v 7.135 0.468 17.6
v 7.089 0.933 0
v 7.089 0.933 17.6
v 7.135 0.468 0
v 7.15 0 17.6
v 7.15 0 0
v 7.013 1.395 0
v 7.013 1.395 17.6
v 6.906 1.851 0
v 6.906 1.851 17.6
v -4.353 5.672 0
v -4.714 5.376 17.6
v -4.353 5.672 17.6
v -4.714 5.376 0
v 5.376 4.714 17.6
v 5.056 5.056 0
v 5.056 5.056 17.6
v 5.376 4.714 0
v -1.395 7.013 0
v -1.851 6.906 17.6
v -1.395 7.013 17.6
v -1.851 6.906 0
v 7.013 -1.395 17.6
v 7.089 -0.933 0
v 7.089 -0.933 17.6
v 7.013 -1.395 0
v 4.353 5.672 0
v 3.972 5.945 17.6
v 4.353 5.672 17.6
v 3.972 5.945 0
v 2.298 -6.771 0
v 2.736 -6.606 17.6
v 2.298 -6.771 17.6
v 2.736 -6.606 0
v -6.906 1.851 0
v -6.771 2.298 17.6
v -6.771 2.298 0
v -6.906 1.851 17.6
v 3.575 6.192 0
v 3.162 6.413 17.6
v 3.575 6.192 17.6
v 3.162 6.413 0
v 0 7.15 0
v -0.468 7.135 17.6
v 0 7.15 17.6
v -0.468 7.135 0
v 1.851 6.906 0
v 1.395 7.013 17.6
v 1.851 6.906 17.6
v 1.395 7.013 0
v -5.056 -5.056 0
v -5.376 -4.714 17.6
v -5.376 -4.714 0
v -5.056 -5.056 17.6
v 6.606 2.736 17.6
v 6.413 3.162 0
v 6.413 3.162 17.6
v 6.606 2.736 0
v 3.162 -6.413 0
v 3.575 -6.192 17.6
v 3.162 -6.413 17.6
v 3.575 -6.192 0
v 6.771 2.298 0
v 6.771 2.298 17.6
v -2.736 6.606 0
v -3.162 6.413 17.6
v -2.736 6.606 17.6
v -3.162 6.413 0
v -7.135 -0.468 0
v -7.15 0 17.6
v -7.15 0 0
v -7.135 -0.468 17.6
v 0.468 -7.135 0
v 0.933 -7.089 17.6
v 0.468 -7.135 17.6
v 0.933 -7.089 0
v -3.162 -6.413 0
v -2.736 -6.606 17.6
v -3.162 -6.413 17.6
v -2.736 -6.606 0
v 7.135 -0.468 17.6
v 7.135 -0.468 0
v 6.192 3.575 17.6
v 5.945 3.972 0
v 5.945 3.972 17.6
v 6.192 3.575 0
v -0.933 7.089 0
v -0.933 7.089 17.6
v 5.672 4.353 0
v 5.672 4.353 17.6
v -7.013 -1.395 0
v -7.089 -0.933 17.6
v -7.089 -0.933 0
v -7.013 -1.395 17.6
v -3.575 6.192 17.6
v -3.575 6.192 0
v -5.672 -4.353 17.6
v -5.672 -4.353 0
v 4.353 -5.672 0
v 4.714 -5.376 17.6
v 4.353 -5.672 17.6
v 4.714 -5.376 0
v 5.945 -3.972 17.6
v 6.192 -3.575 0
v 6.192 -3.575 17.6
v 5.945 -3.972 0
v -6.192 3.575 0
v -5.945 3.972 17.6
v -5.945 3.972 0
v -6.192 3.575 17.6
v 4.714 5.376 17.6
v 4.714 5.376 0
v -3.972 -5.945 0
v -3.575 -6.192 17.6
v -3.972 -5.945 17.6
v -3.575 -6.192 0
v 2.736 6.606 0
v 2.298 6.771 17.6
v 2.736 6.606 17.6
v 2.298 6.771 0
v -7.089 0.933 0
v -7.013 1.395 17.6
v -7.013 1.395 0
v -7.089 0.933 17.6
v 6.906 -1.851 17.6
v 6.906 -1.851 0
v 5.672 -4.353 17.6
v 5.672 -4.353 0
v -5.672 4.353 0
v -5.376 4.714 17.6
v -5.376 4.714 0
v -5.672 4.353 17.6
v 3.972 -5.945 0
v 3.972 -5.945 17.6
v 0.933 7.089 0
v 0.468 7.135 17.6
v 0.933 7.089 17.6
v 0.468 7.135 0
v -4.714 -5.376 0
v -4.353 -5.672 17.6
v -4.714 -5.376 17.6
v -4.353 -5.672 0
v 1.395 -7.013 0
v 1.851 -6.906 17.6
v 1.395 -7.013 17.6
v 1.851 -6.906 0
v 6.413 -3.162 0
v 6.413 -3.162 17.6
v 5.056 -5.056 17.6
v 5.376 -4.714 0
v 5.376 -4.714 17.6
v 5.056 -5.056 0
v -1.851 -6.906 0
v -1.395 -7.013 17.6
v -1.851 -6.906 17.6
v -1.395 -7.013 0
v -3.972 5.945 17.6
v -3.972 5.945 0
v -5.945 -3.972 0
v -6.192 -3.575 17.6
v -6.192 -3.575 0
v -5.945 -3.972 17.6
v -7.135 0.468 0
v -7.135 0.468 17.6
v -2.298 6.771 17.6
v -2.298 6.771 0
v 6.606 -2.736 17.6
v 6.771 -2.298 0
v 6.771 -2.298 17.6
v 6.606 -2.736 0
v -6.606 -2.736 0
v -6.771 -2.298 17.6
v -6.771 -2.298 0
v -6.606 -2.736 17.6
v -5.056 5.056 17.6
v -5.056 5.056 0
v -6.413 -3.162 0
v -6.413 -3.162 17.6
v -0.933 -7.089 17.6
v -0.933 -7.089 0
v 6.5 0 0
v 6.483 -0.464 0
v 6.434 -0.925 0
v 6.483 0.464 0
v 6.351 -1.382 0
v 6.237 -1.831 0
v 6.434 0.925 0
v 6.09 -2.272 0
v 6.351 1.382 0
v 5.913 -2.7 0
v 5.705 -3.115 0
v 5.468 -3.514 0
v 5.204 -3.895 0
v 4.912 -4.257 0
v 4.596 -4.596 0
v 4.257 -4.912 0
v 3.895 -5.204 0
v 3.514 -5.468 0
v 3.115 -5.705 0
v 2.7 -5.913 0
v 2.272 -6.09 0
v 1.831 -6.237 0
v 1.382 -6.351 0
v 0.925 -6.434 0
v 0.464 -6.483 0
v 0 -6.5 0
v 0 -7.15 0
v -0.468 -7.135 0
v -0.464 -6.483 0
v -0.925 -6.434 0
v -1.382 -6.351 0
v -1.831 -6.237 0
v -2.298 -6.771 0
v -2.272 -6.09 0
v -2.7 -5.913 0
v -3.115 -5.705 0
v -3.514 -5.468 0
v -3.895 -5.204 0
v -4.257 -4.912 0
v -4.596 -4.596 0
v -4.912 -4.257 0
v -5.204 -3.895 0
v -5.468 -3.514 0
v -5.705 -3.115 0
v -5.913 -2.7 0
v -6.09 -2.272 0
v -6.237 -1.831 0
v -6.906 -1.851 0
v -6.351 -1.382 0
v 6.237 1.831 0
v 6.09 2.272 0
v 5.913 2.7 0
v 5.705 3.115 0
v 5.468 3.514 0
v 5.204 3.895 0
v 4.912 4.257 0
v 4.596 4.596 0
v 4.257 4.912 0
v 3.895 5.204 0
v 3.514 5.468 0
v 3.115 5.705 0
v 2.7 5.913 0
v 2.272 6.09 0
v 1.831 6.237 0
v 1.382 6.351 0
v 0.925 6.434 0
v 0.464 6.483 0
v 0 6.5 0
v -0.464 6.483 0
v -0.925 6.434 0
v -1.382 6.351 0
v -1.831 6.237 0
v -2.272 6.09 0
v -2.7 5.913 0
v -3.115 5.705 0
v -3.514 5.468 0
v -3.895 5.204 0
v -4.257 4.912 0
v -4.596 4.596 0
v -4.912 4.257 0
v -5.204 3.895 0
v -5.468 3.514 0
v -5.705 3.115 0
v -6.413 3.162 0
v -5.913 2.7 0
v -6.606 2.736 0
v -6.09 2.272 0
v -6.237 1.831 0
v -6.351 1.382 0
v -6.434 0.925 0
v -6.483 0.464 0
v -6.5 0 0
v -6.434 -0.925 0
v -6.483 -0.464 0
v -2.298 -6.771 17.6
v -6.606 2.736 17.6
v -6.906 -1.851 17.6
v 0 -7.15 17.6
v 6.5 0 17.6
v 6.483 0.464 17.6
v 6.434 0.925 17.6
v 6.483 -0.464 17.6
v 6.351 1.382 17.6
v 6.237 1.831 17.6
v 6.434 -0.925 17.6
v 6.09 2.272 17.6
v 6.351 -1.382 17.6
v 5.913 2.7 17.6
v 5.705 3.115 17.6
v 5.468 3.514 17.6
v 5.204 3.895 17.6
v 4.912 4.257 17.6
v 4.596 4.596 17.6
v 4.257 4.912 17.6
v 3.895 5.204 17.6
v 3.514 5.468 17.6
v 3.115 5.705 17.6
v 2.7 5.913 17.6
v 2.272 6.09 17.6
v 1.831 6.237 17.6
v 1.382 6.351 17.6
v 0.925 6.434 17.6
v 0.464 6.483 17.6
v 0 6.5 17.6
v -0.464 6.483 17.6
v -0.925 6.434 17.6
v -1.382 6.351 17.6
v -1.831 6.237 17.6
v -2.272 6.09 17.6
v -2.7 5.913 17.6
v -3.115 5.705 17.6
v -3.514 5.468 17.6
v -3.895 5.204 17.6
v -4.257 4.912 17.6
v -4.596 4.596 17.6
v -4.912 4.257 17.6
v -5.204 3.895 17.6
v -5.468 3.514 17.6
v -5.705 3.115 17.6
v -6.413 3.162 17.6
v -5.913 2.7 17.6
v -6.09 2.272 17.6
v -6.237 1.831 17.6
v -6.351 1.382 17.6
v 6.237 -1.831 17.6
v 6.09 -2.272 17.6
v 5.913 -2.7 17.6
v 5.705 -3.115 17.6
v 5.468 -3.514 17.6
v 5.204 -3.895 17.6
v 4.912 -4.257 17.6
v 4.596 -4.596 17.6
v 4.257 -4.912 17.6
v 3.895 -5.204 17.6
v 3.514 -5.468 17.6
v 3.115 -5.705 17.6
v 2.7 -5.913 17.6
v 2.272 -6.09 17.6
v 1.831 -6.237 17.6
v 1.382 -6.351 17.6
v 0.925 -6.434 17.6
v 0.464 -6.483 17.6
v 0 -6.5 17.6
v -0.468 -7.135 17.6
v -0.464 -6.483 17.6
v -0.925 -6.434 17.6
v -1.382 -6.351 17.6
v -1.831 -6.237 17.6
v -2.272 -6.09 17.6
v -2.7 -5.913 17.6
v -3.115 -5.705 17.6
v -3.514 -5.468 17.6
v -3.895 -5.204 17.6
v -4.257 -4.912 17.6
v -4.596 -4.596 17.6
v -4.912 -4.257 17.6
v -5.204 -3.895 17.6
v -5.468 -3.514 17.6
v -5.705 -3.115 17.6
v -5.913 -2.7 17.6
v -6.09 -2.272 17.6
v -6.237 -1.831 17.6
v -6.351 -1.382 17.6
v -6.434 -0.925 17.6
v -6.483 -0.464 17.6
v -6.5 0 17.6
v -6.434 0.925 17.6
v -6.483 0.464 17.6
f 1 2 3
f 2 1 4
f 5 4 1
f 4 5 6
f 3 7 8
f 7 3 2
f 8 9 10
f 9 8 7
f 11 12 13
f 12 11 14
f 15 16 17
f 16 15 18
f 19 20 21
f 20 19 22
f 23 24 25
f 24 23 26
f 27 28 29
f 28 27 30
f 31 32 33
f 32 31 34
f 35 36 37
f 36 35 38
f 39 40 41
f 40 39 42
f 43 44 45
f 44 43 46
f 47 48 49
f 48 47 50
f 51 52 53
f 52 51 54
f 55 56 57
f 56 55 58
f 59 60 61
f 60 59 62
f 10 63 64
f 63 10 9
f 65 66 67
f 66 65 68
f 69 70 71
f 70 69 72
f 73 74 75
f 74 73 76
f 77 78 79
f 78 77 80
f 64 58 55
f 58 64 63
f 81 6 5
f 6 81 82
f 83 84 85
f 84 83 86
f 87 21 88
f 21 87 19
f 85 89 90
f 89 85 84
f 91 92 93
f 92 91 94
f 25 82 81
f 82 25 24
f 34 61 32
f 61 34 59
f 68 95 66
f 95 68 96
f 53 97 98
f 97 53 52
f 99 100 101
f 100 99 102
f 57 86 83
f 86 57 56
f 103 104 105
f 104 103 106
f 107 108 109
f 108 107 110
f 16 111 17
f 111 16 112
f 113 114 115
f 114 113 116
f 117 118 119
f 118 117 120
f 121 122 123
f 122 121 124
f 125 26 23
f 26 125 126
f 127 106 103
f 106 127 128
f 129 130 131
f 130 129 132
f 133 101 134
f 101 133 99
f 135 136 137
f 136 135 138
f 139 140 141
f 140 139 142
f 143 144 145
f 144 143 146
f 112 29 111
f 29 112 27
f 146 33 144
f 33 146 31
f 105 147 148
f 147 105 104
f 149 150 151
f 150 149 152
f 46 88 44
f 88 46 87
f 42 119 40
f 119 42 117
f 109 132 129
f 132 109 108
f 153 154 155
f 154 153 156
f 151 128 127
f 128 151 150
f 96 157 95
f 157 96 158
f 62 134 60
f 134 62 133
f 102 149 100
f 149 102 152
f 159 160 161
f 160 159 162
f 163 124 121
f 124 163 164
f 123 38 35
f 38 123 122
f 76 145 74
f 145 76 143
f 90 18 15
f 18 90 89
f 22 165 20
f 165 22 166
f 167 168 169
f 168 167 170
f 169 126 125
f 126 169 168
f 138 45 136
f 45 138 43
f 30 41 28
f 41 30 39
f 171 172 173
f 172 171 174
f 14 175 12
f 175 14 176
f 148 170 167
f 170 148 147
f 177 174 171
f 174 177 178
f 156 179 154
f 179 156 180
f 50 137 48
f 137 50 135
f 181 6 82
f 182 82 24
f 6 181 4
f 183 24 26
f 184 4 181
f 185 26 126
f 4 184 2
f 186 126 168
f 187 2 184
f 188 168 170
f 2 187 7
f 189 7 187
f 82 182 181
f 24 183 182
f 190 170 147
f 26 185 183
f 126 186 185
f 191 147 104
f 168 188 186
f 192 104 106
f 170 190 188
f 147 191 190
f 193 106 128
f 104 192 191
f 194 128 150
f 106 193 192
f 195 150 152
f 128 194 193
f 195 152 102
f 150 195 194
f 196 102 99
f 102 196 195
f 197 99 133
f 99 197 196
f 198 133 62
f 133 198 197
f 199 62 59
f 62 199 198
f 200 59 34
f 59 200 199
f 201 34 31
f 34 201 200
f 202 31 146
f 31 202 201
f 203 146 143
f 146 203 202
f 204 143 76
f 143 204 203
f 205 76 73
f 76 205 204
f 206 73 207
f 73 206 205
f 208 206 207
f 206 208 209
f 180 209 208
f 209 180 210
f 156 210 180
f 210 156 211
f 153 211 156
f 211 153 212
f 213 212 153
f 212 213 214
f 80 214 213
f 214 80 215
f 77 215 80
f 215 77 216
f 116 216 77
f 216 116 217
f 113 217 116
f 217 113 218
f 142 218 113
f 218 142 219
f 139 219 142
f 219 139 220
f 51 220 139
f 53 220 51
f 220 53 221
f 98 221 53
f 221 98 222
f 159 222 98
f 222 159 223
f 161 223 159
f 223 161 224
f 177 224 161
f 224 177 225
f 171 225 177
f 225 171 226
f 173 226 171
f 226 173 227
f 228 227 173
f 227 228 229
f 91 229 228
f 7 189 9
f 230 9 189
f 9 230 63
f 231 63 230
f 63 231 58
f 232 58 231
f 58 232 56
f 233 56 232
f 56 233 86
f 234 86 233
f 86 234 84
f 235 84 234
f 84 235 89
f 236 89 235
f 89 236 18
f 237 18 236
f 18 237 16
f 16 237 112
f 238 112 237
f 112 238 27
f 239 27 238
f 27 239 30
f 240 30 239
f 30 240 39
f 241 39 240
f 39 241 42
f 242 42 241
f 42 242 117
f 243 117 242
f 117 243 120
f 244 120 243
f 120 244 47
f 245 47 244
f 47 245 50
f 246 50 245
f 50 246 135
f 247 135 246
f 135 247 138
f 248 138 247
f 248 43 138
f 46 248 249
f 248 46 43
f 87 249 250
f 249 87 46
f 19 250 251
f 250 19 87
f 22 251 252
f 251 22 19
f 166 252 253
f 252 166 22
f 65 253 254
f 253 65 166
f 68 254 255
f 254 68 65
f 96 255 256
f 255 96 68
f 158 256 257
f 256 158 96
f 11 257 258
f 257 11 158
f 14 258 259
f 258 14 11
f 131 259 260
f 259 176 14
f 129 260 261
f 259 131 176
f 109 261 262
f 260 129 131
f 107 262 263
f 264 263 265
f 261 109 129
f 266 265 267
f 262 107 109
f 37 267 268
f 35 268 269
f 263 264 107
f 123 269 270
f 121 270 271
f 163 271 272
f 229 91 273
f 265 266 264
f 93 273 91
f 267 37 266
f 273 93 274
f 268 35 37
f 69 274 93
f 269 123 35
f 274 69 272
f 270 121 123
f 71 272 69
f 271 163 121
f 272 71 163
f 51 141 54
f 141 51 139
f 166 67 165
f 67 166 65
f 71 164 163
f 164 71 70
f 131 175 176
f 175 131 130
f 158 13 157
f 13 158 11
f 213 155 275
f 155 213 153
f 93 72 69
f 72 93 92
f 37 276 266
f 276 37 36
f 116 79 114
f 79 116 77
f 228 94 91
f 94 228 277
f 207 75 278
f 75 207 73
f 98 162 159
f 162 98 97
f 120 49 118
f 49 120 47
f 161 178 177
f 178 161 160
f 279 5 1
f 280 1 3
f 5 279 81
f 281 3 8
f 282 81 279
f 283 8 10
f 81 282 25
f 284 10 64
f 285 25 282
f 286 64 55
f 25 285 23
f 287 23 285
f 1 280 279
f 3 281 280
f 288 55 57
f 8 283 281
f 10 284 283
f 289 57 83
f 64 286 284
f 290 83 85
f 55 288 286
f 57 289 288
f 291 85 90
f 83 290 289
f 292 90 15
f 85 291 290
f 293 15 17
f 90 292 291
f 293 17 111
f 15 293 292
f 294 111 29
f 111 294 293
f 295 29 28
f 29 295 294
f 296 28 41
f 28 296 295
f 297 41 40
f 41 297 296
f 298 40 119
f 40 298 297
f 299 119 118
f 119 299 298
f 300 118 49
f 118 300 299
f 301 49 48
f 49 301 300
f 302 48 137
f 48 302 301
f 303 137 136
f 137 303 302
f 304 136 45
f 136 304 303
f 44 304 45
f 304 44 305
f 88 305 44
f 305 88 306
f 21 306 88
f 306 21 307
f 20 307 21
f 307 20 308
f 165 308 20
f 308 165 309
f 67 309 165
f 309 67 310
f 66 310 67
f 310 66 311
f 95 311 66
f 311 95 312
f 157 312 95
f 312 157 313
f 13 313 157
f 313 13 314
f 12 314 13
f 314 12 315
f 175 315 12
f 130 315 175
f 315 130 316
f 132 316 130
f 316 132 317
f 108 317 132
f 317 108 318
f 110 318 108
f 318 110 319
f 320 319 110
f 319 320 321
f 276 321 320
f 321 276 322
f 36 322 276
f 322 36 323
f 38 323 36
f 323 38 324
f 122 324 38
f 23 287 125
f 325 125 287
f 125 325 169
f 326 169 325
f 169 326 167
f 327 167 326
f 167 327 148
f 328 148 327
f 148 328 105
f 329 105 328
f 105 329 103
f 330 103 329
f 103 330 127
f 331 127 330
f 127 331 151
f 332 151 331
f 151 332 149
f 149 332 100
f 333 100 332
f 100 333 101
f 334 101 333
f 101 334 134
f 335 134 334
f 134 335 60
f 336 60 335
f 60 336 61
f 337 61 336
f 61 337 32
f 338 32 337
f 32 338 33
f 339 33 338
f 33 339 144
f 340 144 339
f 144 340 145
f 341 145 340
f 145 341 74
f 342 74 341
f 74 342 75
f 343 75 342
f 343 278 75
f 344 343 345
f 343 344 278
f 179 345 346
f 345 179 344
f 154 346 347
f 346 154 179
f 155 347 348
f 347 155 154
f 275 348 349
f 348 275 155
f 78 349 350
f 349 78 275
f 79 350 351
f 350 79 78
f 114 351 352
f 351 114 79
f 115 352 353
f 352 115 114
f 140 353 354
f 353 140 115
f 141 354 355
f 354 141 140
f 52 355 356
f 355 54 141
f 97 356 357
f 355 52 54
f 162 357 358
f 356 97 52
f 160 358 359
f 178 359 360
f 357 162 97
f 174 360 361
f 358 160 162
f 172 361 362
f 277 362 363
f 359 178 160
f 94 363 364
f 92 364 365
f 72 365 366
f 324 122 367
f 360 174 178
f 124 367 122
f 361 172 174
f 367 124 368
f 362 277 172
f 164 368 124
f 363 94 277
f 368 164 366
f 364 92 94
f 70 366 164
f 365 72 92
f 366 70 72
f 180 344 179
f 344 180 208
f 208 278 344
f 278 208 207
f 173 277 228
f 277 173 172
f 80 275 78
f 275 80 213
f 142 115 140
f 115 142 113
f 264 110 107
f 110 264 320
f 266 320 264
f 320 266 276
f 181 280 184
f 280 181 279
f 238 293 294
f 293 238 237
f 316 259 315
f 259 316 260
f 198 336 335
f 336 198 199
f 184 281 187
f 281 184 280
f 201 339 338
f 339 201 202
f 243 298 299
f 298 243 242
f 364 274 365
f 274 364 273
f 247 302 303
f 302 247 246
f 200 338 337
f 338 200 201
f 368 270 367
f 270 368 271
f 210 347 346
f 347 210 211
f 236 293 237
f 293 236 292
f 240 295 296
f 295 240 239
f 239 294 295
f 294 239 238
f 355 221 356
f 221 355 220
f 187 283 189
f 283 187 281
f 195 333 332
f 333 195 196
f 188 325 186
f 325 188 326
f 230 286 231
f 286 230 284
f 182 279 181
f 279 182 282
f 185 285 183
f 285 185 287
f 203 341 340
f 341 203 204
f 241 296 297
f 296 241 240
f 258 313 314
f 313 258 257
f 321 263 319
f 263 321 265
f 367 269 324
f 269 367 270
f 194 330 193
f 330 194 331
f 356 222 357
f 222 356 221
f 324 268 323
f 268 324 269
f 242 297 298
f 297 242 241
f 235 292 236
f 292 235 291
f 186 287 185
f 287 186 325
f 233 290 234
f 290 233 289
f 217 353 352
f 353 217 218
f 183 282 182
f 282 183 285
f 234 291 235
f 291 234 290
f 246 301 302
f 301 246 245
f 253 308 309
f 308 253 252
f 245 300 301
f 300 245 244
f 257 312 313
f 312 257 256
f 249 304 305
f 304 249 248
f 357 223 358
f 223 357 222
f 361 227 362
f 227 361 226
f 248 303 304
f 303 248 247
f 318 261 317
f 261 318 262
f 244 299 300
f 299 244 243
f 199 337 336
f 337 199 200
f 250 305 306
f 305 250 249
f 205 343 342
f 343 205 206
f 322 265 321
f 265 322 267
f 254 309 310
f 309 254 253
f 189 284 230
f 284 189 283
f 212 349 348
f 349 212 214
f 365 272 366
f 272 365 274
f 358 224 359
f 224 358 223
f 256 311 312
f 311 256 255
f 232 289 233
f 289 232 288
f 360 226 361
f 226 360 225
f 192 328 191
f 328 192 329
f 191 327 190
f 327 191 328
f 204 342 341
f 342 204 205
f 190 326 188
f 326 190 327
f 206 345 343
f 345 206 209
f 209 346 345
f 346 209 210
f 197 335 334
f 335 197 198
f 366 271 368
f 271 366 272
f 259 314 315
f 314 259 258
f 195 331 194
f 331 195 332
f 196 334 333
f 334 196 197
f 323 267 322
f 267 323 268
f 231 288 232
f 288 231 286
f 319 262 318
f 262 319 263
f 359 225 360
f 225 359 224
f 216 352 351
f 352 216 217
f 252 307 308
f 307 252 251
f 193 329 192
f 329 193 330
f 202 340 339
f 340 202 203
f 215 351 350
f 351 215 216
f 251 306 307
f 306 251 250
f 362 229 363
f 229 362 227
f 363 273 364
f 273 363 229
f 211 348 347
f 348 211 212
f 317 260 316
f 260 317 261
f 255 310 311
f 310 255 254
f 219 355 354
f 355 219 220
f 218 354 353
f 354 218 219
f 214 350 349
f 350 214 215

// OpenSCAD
// part_id: jup11
// name: Jupiter pointer sleeve
// source_drawing_ids: DRW-012
// units: mm
// revision: 0.1
// SPDX-License-Identifier: MIT

module part_jup11(
    outer_d = 14.3,
    inner_d = 13.0,
    height = 17.6,
    lip_h = 2.0,
    lip_d = 14.0
) {
    difference() {
        union() {
            cylinder(d = outer_d, h = height, center = false, $fn = 96);
            translate([0, 0, 0]) cylinder(d = lip_d, h = lip_h, center = false, $fn = 88);
        }
        translate([0, 0, -0.05]) cylinder(d = inner_d, h = height + 0.1, center = false, $fn = 88);
    }
}

// ---- "main guard" ----
// Default to previewing when opened directly:
if (is_undef(__LIB_MODE__)) {
    part_jup11();
}
